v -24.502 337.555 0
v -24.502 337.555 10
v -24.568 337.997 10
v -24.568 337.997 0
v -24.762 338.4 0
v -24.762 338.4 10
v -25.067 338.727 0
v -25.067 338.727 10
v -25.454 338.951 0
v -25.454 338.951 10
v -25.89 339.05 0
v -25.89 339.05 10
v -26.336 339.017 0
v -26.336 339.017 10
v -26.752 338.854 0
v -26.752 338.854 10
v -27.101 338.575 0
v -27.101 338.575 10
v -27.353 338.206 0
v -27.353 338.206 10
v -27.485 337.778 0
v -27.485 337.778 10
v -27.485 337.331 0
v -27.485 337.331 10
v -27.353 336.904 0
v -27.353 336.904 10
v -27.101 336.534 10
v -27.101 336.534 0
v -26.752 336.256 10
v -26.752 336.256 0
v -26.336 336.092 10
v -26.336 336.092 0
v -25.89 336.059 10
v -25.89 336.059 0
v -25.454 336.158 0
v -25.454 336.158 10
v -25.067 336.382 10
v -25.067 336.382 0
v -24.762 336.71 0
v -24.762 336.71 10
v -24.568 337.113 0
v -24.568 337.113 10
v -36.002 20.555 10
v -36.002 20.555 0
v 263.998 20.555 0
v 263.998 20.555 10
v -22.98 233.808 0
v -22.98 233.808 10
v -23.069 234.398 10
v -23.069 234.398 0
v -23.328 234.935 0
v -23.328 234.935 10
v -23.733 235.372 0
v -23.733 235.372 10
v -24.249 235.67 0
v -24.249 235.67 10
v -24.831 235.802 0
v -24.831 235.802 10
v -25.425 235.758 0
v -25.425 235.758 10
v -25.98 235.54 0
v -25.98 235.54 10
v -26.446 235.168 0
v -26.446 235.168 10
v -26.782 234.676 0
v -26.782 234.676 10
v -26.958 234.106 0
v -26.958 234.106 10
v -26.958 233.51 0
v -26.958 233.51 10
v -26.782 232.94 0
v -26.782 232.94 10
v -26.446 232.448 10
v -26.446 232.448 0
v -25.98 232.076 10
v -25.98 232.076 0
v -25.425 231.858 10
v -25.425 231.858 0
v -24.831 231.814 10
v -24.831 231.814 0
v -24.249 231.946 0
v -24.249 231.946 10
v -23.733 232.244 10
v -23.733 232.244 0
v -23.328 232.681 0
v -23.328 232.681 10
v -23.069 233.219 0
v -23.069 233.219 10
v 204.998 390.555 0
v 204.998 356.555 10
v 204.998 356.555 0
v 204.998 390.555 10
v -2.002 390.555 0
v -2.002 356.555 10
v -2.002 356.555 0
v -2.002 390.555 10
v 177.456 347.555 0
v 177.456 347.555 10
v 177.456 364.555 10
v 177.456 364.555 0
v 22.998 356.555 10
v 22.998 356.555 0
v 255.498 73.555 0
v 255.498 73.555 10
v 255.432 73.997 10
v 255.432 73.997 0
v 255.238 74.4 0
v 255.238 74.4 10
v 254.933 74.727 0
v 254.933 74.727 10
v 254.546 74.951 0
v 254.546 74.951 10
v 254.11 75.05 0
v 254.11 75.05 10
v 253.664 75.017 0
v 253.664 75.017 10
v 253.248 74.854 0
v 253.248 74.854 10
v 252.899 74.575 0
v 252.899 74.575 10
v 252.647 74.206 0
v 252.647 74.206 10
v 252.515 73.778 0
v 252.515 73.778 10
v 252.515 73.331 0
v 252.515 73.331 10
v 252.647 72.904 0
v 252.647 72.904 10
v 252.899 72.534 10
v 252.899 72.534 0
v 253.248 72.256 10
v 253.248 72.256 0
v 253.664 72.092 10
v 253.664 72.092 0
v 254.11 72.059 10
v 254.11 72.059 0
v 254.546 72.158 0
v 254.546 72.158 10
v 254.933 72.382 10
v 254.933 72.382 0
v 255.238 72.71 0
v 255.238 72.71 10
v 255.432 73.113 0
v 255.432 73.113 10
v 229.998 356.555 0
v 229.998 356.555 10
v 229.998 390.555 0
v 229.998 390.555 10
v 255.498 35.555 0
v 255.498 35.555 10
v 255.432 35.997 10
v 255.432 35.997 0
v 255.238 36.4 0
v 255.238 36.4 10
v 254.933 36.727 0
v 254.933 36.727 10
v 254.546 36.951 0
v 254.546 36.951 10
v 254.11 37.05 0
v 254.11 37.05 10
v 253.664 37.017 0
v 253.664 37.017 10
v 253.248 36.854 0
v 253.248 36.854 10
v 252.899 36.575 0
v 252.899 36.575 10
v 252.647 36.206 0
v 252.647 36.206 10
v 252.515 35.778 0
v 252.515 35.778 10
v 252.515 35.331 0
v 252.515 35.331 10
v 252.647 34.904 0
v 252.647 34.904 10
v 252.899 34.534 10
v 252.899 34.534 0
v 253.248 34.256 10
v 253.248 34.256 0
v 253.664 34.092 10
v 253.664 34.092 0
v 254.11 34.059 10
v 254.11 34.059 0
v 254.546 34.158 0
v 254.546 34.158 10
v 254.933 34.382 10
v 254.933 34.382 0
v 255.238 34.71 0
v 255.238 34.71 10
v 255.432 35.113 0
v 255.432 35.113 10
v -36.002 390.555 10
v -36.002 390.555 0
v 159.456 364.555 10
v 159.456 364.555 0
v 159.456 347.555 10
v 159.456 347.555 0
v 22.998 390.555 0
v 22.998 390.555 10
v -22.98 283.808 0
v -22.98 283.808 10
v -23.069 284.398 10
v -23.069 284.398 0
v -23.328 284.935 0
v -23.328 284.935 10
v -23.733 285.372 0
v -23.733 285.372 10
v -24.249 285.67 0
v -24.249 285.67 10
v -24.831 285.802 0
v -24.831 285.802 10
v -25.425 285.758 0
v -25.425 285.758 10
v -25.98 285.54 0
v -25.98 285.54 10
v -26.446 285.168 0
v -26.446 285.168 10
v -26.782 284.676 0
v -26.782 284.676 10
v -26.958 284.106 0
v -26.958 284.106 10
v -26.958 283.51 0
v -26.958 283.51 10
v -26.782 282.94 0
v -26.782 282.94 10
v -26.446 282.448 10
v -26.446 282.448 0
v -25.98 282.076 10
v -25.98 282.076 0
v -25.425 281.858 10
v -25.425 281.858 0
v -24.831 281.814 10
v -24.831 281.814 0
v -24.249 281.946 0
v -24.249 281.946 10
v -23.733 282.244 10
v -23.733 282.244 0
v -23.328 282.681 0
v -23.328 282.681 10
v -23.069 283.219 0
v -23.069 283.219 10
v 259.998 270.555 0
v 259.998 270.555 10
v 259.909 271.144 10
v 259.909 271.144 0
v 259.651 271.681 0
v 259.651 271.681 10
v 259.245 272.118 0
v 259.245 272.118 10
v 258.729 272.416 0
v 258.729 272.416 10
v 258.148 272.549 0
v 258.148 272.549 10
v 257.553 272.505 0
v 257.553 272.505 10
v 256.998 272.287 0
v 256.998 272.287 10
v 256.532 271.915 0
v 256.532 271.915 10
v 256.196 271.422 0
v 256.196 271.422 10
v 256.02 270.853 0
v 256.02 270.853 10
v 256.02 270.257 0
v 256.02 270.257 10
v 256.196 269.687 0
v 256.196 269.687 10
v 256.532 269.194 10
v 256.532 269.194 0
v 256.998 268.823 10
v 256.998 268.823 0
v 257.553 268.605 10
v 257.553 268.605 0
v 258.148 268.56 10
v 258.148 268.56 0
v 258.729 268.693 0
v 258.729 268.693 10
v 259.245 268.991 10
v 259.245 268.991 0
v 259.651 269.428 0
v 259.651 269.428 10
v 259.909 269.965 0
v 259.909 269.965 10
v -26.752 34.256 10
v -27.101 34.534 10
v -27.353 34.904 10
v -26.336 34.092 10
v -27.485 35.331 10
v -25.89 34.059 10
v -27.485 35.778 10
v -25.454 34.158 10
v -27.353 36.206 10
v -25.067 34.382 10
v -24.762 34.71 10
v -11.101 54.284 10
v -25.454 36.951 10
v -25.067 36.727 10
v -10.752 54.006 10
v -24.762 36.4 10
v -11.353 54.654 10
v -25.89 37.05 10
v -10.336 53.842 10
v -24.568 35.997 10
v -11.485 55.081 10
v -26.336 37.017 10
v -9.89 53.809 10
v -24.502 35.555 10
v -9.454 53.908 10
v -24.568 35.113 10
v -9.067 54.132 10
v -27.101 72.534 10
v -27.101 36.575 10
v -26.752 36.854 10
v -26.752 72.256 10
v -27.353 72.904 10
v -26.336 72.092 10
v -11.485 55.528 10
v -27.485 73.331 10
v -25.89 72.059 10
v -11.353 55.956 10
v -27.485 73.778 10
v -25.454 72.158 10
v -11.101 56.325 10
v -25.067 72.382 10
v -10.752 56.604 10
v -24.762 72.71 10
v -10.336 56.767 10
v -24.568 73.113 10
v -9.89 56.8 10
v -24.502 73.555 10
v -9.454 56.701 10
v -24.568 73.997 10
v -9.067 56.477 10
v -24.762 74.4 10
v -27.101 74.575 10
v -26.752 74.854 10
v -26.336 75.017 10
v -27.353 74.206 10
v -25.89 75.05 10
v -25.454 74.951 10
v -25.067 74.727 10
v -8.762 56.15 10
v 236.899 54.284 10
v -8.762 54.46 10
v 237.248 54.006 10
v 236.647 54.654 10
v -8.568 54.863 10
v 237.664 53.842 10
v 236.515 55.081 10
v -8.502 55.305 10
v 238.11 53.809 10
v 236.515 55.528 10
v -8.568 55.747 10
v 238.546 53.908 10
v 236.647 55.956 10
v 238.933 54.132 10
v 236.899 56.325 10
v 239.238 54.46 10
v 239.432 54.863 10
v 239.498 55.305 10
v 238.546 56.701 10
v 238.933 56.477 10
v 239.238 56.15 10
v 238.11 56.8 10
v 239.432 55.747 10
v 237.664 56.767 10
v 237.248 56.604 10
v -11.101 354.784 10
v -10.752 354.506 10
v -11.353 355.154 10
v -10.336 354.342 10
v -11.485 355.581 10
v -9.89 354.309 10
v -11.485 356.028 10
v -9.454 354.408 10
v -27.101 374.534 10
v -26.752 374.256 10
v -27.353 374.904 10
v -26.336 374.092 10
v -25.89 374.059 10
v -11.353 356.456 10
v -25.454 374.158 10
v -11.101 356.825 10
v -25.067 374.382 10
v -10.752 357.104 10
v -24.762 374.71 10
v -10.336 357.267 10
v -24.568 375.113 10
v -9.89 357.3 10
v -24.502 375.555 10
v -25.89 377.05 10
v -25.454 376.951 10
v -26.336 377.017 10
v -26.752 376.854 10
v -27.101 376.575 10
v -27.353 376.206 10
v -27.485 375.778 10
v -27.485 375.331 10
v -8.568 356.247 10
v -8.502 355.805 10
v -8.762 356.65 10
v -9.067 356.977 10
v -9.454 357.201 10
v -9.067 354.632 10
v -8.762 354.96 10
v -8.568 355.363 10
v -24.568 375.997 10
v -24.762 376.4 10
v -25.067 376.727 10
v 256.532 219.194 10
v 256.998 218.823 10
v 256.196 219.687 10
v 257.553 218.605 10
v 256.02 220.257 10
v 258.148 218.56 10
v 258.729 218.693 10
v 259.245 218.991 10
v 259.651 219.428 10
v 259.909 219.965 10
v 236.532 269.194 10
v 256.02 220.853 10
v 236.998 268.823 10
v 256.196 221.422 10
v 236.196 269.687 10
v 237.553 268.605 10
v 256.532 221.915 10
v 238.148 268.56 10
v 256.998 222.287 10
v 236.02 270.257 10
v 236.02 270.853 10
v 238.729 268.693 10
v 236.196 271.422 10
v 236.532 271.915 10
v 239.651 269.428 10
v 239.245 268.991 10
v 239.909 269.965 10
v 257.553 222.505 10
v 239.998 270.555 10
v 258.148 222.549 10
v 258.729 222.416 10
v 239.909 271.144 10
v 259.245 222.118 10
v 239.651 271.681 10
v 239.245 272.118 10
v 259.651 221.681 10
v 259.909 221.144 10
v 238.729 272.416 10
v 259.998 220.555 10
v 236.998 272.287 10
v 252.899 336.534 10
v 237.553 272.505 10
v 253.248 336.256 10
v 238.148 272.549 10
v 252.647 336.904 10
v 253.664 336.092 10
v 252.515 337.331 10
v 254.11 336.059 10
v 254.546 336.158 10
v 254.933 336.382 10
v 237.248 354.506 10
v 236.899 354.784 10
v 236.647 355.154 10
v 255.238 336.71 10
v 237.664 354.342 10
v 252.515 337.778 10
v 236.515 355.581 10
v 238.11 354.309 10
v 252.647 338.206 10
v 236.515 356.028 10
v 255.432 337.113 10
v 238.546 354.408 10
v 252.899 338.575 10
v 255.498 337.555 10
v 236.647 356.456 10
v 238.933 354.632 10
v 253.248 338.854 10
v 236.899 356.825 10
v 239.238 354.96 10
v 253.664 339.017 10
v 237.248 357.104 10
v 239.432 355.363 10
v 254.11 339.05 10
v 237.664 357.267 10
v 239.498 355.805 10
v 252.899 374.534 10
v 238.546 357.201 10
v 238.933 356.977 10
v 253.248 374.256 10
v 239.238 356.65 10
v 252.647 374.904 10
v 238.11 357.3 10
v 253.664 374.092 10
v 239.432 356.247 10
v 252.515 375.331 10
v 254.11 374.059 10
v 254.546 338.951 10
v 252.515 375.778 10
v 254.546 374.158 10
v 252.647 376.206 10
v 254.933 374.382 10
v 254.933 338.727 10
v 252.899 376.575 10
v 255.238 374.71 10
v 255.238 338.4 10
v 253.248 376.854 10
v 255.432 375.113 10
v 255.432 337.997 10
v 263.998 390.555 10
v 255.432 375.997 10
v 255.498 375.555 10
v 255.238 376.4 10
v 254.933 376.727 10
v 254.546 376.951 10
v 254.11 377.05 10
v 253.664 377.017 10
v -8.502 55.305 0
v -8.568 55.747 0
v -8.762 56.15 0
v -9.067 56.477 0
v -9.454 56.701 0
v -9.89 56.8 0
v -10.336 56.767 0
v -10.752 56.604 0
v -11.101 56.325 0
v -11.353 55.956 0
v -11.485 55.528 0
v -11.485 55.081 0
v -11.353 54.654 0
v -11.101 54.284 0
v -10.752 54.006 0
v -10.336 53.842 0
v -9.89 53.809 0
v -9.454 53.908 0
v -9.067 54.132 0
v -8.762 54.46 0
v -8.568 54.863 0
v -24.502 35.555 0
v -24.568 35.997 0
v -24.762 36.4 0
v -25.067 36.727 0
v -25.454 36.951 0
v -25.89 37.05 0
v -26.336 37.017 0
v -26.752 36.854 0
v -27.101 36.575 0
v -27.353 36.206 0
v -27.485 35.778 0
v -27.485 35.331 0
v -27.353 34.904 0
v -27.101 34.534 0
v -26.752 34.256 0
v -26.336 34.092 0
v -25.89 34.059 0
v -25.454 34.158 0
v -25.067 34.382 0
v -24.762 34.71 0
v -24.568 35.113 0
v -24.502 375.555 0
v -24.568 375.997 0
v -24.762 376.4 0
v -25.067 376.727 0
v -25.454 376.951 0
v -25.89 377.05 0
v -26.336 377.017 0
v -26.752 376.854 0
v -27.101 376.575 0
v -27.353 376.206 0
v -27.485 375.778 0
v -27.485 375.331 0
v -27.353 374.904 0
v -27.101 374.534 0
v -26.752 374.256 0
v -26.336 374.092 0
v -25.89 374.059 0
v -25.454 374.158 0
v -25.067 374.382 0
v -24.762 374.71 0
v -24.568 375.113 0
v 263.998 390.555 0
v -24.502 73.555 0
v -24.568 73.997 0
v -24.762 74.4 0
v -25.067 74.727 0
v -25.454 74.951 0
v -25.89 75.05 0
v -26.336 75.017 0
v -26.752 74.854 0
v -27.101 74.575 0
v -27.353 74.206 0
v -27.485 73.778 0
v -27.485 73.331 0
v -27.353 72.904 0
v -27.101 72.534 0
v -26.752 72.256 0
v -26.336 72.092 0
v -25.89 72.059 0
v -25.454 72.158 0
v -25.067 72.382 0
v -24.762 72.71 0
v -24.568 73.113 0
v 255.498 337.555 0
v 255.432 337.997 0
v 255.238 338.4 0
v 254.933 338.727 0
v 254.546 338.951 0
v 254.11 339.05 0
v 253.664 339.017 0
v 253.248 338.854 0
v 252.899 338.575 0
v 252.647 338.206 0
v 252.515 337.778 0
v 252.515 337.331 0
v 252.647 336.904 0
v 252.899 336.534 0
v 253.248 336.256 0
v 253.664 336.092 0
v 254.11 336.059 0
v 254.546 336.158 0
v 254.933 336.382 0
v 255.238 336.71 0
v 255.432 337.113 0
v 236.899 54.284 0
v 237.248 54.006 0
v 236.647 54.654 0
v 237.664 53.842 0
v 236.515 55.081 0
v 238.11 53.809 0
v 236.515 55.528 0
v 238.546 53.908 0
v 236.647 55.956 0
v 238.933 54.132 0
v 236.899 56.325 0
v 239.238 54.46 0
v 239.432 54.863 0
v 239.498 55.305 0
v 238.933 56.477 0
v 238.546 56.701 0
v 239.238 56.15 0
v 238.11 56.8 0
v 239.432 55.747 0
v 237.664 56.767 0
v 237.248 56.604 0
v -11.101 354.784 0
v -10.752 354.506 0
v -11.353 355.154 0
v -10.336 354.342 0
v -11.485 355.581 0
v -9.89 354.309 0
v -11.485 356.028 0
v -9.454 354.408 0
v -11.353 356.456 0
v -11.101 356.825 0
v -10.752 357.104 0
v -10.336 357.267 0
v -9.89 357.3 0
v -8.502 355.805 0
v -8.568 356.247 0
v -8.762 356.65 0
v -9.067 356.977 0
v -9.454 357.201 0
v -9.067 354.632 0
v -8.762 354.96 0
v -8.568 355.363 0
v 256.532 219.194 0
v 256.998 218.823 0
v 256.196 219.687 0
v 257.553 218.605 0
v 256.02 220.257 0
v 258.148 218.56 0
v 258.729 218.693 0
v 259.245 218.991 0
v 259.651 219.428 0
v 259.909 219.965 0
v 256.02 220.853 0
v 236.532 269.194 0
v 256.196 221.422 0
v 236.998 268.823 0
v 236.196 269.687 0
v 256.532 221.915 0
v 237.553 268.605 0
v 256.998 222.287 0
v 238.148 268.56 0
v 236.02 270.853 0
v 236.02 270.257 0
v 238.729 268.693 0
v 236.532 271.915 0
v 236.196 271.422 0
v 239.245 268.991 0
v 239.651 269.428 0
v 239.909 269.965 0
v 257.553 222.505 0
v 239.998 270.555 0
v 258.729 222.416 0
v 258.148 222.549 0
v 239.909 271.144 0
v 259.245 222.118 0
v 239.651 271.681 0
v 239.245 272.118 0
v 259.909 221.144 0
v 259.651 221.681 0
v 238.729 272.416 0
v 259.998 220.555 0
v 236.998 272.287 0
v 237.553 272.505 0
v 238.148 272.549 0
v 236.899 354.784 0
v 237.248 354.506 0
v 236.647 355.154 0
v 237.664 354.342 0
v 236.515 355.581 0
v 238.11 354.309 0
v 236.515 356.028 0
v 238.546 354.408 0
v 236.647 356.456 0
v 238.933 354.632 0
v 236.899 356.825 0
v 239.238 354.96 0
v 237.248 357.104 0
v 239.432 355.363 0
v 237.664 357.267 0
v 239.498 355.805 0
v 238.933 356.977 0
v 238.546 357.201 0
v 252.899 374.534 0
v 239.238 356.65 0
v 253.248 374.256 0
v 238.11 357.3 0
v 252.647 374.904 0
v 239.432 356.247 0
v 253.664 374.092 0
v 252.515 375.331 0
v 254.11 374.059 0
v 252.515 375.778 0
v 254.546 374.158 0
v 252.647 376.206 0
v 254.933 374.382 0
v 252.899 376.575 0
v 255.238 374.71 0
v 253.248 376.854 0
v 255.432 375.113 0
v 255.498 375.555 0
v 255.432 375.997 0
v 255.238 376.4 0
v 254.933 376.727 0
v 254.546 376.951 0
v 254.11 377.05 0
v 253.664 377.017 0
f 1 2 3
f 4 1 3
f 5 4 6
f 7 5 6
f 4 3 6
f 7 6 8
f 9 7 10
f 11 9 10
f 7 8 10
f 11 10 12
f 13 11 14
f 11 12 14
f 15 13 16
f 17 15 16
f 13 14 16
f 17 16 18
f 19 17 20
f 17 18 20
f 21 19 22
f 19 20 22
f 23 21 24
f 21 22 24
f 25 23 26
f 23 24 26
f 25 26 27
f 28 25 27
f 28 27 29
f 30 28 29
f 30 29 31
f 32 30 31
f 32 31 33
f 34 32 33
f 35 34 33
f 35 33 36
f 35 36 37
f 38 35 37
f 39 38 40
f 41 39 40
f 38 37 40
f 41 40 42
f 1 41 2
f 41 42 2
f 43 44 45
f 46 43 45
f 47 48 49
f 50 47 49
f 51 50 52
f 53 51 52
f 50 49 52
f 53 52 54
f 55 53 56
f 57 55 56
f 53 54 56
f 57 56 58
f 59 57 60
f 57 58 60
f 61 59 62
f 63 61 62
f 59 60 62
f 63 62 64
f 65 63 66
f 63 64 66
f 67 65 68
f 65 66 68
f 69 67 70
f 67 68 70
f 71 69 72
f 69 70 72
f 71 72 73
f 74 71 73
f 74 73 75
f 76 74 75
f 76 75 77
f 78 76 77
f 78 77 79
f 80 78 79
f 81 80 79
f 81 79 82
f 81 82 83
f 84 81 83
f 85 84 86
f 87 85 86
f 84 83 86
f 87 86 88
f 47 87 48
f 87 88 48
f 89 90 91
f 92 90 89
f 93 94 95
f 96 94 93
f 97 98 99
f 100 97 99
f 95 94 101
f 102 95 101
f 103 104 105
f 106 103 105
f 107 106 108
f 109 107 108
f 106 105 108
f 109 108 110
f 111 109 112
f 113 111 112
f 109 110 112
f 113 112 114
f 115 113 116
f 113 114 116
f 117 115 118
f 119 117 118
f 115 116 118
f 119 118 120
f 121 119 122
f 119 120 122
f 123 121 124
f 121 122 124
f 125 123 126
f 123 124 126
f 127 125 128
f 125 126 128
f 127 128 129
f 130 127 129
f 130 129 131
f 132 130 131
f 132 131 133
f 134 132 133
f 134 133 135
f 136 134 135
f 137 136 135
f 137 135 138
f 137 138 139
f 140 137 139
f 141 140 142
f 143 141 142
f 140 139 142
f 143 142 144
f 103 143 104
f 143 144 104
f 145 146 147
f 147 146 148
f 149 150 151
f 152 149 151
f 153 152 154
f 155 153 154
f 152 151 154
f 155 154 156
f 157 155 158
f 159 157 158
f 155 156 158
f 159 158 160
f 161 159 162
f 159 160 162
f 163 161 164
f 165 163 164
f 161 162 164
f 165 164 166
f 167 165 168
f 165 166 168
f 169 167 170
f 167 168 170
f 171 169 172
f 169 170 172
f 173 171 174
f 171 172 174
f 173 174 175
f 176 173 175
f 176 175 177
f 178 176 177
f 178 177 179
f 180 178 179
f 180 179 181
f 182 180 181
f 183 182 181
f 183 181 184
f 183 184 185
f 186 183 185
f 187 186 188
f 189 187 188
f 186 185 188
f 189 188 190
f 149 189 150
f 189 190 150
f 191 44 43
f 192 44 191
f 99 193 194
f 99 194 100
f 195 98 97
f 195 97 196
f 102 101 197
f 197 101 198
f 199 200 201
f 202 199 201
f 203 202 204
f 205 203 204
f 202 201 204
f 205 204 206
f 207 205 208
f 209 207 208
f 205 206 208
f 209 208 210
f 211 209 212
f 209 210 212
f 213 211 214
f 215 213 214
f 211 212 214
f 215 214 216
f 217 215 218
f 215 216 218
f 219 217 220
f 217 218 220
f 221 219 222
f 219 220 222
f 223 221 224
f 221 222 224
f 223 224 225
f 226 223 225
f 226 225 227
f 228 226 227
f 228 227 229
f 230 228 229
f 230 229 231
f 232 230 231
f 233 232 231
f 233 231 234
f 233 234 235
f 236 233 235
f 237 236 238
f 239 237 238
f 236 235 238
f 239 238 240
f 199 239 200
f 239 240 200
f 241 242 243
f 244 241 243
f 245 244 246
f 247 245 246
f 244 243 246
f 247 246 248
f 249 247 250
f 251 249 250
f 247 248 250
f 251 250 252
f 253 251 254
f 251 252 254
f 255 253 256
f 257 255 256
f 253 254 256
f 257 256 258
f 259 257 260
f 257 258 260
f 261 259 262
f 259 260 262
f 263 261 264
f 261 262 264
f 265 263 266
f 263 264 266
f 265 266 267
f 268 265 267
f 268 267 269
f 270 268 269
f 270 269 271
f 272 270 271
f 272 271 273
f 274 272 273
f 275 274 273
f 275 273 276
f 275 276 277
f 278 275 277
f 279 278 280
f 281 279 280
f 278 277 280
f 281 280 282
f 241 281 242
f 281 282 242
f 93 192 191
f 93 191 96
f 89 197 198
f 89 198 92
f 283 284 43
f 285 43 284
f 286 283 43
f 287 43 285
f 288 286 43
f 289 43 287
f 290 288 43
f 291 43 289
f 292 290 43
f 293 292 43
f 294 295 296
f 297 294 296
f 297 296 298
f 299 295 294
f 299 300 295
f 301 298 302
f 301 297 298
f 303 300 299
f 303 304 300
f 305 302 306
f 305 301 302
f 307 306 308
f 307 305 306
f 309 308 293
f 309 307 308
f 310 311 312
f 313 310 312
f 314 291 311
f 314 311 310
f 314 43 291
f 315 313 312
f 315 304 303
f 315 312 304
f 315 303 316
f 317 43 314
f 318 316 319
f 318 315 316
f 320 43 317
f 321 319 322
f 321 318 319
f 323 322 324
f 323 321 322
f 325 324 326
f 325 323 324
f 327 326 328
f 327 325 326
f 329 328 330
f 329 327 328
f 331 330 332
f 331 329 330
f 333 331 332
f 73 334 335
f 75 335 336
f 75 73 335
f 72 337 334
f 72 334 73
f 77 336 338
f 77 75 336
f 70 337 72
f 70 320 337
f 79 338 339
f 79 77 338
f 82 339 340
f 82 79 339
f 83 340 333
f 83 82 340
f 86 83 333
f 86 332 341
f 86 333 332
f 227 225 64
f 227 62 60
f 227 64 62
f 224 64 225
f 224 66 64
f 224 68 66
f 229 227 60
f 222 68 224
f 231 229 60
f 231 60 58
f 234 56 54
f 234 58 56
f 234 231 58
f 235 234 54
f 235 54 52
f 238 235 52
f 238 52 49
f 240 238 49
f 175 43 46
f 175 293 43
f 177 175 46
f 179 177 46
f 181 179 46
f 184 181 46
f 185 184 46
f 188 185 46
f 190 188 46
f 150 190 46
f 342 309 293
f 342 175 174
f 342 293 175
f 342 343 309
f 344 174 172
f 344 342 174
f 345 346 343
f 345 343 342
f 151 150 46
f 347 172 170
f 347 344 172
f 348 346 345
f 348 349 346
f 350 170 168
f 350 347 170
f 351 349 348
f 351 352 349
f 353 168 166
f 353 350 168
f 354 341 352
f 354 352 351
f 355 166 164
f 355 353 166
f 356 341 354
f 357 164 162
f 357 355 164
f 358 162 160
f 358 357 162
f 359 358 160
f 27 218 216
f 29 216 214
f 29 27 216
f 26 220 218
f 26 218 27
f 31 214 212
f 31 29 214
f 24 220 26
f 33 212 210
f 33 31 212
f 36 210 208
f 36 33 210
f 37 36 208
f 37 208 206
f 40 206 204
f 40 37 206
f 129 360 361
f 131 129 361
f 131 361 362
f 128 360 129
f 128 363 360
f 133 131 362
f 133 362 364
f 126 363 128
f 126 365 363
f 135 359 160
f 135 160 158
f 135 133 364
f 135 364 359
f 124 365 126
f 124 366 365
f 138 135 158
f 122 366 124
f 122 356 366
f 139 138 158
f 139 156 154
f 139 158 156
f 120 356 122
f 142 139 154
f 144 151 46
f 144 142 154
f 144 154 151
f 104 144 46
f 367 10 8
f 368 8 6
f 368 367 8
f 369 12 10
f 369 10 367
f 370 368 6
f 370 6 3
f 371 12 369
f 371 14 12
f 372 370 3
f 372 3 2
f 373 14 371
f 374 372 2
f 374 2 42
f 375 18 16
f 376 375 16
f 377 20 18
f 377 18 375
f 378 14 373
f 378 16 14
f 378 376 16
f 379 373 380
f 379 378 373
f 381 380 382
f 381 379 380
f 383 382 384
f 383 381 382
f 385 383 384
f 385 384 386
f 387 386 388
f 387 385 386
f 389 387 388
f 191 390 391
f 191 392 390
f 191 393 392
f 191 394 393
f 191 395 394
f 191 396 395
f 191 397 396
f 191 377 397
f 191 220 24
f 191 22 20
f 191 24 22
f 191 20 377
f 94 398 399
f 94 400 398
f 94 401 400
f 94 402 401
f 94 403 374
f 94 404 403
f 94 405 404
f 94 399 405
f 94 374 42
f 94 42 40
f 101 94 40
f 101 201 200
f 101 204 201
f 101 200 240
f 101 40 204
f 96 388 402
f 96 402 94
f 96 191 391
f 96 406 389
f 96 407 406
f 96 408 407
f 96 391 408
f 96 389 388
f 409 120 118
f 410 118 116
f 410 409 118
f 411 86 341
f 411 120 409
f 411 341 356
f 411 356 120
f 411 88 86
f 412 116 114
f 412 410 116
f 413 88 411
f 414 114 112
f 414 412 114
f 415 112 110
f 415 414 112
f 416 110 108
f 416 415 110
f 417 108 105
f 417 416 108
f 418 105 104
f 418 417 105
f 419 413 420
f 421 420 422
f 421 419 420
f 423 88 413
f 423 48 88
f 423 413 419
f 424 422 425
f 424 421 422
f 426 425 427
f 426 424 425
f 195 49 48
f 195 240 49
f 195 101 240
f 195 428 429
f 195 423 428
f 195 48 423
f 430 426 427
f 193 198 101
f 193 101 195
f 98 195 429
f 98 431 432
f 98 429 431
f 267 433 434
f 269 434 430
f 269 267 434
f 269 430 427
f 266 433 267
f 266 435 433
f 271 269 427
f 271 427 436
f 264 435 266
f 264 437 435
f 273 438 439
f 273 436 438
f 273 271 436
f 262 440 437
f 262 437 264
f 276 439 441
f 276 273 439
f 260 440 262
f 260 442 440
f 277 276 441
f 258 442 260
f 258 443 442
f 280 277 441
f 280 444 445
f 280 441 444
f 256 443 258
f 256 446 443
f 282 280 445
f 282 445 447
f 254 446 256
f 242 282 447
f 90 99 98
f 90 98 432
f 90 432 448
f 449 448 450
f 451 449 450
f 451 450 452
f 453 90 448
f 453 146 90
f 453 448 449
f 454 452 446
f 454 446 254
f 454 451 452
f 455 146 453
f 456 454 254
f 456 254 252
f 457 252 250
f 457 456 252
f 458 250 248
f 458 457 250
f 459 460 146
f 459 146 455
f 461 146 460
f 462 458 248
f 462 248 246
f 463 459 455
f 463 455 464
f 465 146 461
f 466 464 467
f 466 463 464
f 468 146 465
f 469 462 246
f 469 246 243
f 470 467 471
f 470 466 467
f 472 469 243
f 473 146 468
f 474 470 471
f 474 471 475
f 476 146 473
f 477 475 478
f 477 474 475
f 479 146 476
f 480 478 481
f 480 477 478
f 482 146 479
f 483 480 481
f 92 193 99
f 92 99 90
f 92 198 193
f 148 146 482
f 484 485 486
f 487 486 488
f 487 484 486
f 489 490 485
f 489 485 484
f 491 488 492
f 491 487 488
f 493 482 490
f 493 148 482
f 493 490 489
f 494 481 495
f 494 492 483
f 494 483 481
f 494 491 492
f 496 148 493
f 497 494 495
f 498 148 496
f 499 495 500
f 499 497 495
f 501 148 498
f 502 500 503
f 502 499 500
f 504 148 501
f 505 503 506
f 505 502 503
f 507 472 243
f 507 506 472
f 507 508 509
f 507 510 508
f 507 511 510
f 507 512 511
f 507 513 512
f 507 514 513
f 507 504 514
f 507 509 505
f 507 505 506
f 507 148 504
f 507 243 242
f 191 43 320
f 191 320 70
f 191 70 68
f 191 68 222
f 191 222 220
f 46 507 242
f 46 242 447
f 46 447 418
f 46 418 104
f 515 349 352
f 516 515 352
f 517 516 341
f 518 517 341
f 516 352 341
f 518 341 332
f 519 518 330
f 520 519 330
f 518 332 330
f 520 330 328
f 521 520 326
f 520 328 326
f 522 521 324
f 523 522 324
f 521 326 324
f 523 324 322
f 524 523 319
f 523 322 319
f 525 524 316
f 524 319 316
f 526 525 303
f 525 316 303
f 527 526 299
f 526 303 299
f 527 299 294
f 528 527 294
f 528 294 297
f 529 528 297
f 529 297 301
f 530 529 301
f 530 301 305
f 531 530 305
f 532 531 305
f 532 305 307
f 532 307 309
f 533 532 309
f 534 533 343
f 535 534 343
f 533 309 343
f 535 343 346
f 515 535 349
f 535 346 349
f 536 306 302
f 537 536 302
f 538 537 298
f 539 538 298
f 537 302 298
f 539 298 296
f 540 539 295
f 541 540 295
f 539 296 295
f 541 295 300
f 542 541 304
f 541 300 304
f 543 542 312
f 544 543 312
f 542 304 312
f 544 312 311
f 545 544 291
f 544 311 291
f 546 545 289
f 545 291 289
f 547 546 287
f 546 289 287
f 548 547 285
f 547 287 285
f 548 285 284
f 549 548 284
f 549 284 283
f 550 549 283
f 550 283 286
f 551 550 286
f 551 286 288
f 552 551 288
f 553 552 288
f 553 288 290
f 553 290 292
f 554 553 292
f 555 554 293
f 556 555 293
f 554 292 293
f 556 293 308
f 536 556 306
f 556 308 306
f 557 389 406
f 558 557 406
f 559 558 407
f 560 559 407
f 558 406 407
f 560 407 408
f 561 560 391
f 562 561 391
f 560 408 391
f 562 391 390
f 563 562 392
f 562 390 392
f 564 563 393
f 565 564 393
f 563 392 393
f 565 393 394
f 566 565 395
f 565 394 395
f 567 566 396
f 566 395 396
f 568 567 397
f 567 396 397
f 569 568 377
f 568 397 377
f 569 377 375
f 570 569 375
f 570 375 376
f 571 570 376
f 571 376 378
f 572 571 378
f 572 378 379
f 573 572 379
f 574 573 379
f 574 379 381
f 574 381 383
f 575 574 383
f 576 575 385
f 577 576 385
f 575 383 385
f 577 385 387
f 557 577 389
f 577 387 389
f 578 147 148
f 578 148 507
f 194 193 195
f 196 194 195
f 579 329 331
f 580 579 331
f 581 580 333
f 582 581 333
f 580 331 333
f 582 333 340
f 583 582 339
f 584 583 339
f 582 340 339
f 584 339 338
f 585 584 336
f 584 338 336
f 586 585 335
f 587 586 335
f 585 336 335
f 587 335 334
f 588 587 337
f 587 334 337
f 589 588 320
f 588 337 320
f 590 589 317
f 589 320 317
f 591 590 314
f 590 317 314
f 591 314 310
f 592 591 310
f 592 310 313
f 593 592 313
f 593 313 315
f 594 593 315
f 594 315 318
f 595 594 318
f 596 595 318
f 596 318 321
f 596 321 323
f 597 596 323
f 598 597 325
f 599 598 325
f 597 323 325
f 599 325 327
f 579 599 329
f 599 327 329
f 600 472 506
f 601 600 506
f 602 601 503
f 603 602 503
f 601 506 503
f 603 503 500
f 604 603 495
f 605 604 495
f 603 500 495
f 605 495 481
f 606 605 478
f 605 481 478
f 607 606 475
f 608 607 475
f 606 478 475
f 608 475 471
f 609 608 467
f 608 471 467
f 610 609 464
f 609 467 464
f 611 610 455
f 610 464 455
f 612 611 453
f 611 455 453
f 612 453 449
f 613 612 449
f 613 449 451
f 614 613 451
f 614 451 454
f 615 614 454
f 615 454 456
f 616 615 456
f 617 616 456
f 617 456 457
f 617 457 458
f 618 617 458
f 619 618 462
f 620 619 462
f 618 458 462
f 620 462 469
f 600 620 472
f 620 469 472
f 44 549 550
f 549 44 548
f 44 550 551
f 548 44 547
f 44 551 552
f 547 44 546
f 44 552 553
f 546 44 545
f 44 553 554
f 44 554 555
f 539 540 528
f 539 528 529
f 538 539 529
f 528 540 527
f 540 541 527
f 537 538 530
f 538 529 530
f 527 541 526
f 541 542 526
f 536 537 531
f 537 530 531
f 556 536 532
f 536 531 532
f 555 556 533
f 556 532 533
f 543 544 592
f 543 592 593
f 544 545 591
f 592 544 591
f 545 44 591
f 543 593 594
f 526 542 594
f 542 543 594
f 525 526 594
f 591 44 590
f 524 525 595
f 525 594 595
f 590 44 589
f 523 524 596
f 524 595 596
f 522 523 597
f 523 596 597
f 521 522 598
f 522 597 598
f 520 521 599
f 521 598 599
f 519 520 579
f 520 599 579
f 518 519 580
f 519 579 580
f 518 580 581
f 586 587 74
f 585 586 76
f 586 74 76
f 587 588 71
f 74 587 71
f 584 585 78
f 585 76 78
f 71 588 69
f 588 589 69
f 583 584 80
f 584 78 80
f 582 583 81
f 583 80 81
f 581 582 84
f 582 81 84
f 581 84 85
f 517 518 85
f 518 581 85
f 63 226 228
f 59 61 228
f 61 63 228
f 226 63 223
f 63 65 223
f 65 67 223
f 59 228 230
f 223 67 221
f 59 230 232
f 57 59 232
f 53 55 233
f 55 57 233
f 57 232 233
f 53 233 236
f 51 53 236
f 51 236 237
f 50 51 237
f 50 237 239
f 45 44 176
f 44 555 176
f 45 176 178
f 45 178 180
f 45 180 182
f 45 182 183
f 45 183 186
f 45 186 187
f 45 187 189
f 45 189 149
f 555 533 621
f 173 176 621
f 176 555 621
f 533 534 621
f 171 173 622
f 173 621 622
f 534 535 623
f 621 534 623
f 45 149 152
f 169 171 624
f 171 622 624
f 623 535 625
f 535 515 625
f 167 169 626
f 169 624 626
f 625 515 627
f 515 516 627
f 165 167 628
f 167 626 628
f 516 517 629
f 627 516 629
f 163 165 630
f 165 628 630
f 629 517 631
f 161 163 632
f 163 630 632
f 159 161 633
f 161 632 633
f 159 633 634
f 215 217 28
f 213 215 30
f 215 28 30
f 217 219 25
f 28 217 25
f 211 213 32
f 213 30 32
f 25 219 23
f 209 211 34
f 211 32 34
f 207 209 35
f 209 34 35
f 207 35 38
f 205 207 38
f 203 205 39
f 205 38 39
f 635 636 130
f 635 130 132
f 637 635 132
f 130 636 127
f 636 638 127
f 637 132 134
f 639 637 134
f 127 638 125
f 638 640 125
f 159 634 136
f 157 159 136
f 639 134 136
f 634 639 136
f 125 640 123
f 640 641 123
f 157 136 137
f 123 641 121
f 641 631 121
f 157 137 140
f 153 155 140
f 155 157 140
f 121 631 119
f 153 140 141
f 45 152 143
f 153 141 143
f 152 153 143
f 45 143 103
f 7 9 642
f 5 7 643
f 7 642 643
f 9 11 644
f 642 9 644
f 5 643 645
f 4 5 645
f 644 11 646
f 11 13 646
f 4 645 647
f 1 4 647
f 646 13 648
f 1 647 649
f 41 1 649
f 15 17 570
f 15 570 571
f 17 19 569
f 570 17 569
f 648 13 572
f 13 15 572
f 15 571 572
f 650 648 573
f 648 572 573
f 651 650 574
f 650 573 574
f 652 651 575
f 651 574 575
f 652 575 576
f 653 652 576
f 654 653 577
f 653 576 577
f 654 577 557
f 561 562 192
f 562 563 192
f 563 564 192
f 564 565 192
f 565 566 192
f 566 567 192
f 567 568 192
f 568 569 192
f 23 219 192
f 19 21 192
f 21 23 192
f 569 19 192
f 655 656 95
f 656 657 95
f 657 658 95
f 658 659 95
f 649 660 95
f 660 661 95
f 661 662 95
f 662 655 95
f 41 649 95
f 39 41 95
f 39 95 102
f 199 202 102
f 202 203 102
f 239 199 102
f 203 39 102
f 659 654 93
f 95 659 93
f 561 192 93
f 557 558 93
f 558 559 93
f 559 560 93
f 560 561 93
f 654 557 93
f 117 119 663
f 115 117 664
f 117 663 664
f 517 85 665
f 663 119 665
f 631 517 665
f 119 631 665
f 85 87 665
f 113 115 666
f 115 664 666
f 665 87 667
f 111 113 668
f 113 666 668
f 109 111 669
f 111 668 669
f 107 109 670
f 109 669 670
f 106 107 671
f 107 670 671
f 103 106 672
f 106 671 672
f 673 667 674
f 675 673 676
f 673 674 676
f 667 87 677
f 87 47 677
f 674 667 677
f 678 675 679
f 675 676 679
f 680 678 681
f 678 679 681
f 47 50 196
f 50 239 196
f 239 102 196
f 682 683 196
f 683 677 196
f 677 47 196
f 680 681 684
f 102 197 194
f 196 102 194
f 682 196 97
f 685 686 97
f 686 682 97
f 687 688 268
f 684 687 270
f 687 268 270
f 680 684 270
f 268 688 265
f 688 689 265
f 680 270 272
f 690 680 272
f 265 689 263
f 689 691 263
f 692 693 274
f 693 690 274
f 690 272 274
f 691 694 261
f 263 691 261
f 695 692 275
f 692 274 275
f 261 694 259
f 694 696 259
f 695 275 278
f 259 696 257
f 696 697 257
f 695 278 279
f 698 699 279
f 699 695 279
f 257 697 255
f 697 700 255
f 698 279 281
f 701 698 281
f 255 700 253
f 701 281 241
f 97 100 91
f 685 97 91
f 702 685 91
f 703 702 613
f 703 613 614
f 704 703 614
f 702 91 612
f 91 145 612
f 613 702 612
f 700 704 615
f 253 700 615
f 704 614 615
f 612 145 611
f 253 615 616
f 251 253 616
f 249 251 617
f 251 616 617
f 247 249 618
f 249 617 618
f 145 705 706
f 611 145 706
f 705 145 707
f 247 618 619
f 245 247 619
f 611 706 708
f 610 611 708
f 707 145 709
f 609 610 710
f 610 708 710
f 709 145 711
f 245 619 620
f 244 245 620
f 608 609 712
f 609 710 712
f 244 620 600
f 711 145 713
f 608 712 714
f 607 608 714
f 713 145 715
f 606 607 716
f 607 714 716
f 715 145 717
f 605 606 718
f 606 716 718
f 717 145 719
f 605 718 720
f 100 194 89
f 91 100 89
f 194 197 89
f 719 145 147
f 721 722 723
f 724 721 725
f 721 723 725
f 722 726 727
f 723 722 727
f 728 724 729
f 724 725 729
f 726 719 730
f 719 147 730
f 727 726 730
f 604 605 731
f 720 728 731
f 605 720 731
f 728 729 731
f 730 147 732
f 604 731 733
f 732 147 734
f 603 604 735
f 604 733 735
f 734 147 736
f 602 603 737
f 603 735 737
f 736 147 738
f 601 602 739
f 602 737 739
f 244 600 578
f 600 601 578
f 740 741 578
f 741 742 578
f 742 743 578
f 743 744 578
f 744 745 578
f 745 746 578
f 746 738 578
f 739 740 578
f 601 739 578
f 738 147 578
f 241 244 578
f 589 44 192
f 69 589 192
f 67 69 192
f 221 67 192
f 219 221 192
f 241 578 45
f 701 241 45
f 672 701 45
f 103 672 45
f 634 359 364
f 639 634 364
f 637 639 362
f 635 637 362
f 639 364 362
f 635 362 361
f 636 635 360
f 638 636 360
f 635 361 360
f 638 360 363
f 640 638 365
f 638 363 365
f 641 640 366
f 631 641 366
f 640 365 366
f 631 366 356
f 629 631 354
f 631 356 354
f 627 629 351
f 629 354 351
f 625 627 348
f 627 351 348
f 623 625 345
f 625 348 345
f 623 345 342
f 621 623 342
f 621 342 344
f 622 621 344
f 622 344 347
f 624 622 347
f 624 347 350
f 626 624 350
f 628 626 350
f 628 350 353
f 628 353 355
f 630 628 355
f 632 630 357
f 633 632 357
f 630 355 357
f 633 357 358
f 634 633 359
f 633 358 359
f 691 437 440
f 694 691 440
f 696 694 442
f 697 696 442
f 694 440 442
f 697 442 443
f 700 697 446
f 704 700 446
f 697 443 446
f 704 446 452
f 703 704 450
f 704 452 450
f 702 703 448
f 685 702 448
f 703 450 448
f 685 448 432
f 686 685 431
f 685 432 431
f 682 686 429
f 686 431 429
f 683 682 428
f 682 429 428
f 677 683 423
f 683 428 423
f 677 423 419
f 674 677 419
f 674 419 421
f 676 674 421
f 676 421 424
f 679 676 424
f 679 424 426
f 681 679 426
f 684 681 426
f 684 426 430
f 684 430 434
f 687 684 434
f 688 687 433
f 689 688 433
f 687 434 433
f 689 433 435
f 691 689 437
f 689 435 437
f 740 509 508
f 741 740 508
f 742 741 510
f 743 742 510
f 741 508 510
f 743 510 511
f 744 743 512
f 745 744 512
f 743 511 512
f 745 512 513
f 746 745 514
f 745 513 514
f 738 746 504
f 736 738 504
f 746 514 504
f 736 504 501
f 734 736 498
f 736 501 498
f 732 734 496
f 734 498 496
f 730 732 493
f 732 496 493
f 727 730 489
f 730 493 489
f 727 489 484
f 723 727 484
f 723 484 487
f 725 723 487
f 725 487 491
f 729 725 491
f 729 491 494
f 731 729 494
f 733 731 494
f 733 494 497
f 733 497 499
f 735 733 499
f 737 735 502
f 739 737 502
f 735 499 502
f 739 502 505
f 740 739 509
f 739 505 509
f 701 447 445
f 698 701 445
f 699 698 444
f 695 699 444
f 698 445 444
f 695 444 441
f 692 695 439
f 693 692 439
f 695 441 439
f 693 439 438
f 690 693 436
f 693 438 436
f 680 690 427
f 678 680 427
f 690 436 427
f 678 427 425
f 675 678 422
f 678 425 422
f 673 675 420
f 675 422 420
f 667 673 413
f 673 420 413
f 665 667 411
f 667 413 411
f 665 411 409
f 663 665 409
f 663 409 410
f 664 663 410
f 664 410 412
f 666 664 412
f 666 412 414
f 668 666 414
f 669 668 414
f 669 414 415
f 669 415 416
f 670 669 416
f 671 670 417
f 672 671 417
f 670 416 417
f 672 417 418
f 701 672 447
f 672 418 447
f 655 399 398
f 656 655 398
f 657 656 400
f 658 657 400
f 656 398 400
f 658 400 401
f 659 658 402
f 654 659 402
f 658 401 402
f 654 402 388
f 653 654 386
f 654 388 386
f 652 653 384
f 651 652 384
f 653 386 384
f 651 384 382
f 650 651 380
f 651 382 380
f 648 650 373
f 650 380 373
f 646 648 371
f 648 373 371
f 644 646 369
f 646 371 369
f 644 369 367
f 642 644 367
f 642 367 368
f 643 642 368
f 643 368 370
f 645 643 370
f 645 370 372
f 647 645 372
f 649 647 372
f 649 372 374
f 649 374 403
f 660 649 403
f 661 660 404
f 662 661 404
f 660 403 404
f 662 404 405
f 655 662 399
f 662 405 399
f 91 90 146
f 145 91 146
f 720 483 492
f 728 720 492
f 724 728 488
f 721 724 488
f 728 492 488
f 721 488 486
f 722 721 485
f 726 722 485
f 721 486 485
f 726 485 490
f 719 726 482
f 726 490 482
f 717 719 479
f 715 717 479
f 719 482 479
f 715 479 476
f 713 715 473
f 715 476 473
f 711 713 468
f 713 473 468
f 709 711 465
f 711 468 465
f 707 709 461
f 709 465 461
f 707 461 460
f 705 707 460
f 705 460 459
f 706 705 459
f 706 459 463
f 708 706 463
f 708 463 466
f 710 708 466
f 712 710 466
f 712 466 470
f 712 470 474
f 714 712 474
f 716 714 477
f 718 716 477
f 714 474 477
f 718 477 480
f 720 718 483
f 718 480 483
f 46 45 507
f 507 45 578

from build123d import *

# Parameters (mm, degrees)
SKETCH_1_W          = 300
SKETCH_1_H          = 370
EXTRUDE_1_DEPTH     = 10
SKETCH_2_R          = 1.5
SKETCH_2_R_2        = 2
SKETCH_2_W          = 25
SKETCH_2_H          = 34
CUT_EXTRUDE_1_DEPTH = 10


with BuildPart() as part:
    # 草图1 → 凸台-拉伸1 (new body)
    with BuildSketch(Plane.XY):
        with Locations((113.99815703, 205.554685433)):
            Rectangle(SKETCH_1_W, SKETCH_1_H)
    extrude(amount=EXTRUDE_1_DEPTH)

    # 草图2 → 切除-拉伸1 (cut)
    with BuildSketch(Plane.XY.offset(10)):
        with Locations((253.99815703, 375.554685433)):
            Circle(SKETCH_2_R)
        with Locations((253.99815703, 337.554685433)):
            Circle(SKETCH_2_R)
        with Locations((-26.00184297, 337.554685433)):
            Circle(SKETCH_2_R)
        with Locations((-26.00184297, 375.554685433)):
            Circle(SKETCH_2_R)
        with Locations((-26.00184297, 35.554685433)):
            Circle(SKETCH_2_R)
        with Locations((-26.00184297, 73.554685433)):
            Circle(SKETCH_2_R)
        with Locations((253.99815703, 73.554685433)):
            Circle(SKETCH_2_R)
        with Locations((253.99815703, 35.554685433)):
            Circle(SKETCH_2_R)
        with Locations((237.99815703, 355.804685433)):
            Circle(SKETCH_2_R)
        with Locations((-10.00184297, 355.804685433)):
            Circle(SKETCH_2_R)
        with Locations((-10.00184297, 55.304685433)):
            Circle(SKETCH_2_R)
        with Locations((237.99815703, 55.304685433)):
            Circle(SKETCH_2_R)
        with Locations((237.99815703, 270.554685433)):
            Circle(SKETCH_2_R_2)
        with Locations((257.99815703, 270.554685433)):
            Circle(SKETCH_2_R_2)
        with Locations((257.99815703, 220.554685433)):
            Circle(SKETCH_2_R_2)
        with Locations((-24.980137122, 233.80801348)):
            Circle(SKETCH_2_R_2)
        with Locations((-24.980137122, 283.80801348)):
            Circle(SKETCH_2_R_2)
        with Locations((217.49815703, 373.554685433)):
            Rectangle(SKETCH_2_W, SKETCH_2_H)
        with Locations((10.49815703, 373.554685433)):
            Rectangle(SKETCH_2_W, SKETCH_2_H)
        Polygon((159.455584524, 355.554685433), (159.455584524, 364.554685433), (177.455584524, 364.554685433), (177.455584524, 356.554685433), (177.455584524, 347.554685433), (159.455584524, 347.554685433), align=None)
    extrude(amount=-CUT_EXTRUDE_1_DEPTH, mode=Mode.SUBTRACT)


solid = part.part
